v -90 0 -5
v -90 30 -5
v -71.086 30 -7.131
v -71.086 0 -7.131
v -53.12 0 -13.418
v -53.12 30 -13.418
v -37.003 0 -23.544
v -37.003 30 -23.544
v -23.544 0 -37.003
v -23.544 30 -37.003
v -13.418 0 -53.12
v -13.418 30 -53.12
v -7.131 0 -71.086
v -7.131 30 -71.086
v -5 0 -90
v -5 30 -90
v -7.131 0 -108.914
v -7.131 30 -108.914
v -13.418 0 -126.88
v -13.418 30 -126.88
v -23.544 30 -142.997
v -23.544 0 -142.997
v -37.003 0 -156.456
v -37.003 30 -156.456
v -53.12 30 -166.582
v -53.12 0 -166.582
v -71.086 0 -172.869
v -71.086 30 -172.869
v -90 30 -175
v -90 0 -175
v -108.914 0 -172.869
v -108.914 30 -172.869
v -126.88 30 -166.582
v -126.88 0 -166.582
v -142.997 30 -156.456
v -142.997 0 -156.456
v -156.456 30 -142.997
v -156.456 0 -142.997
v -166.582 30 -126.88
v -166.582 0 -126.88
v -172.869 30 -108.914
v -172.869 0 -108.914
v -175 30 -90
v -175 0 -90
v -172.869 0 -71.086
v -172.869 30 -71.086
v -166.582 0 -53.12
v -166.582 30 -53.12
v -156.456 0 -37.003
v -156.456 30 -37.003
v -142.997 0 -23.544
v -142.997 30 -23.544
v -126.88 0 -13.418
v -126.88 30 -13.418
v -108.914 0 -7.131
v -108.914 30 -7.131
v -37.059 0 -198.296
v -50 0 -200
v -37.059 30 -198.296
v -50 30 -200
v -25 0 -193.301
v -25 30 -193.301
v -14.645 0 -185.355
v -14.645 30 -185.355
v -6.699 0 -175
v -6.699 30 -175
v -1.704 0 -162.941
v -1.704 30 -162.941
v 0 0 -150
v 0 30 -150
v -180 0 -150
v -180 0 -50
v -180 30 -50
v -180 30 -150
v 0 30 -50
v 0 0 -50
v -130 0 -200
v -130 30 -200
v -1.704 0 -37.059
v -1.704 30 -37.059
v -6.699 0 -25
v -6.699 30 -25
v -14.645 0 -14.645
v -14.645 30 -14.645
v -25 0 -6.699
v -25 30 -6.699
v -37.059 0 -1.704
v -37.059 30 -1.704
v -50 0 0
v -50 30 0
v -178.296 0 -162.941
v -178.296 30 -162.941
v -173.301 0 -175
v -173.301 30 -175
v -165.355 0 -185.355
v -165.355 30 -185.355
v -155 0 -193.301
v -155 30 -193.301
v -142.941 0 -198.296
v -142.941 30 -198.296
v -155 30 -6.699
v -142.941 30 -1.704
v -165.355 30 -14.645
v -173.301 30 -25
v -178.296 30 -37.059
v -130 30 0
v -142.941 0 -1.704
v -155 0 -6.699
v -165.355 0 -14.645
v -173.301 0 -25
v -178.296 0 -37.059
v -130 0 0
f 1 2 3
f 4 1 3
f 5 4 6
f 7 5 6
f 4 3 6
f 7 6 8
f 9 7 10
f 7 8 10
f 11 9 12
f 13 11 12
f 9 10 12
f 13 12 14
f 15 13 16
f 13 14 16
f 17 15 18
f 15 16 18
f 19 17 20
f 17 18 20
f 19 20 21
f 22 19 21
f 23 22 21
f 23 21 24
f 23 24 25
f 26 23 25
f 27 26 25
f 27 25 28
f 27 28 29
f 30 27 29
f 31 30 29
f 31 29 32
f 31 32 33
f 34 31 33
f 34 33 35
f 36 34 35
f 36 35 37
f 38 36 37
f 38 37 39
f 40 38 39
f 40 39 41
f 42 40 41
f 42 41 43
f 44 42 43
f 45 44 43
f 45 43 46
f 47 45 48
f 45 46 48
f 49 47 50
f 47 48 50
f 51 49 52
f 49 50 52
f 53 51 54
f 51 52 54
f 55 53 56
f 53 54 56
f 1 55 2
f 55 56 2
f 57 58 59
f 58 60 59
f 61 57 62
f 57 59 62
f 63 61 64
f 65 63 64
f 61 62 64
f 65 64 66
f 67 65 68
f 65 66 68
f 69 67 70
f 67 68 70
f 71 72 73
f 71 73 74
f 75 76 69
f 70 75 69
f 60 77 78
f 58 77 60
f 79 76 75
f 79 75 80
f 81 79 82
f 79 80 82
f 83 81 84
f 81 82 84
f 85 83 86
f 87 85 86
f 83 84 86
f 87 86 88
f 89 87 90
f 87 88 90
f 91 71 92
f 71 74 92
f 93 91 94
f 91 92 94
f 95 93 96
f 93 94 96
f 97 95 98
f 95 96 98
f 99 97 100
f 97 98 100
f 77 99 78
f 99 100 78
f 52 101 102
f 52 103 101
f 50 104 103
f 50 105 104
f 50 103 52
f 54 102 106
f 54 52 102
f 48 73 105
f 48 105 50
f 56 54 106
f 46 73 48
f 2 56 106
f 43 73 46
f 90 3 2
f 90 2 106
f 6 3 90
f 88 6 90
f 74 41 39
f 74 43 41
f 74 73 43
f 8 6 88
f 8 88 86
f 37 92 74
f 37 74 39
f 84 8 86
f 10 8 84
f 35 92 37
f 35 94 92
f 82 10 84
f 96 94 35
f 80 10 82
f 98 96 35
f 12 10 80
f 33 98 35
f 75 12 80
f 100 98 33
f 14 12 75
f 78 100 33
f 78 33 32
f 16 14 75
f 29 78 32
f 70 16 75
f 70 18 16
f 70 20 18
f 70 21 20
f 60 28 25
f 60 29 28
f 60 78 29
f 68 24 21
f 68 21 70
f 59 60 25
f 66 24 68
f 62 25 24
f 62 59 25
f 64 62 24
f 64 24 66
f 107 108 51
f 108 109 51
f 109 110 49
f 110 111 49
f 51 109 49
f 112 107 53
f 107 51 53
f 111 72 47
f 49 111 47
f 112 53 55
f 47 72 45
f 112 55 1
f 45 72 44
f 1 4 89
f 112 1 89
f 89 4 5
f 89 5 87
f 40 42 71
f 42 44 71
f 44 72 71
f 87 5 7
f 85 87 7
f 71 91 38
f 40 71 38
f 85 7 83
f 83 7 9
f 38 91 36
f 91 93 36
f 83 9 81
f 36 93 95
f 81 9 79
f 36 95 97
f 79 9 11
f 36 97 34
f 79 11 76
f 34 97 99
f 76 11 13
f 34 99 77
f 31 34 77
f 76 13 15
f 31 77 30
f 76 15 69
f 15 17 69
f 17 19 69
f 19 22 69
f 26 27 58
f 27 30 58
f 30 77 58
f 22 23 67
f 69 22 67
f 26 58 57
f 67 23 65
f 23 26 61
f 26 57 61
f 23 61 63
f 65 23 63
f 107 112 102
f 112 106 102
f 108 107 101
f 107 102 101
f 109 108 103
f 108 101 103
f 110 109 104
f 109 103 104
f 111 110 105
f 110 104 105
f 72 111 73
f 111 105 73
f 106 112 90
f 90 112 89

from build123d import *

# Parameters (mm, degrees)
SKETCH1_W           = 180
SKETCH1_H           = 200
BOSS_EXTRUDE1_DEPTH = 30
SKETCH7_R           = 85
CUT_EXTRUDE1_DEPTH  = 40
FILLET1_R           = 50
FILLET2_R           = 50
FILLET3_R           = 50
FILLET4_R           = 50


with BuildPart() as part:
    # Sketch1 → Boss-Extrude1 (new body)
    with BuildSketch(Plane(origin=(0, 0, 0), x_dir=(1, 0, 0), z_dir=(0, 1, 0))):
        with Locations((-90, 100)):
            Rectangle(SKETCH1_W, SKETCH1_H)
    extrude(amount=BOSS_EXTRUDE1_DEPTH)

    # Sketch7 → Cut-Extrude1 (cut)
    with BuildSketch(Plane(origin=(0, 30, 0), x_dir=(1, 0, 0), z_dir=(0, 1, 0))):
        with Locations(Location((-90, 90, 0), (0, 0, 270))):
            Circle(SKETCH7_R)
    extrude(amount=-CUT_EXTRUDE1_DEPTH, mode=Mode.SUBTRACT)

    # Fillet1
    fillet1_edges = [part.edges().sort_by_distance(p)[0] for p in [
        (0, 15, -200),
    ]]
    fillet(fillet1_edges, radius=FILLET1_R)

    # Fillet2
    fillet2_edges = [part.edges().sort_by_distance(p)[0] for p in [
        (0, 15, 0),
    ]]
    fillet(fillet2_edges, radius=FILLET2_R)

    # Fillet3
    fillet3_edges = [part.edges().sort_by_distance(p)[0] for p in [
        (-180, 15, 0),
    ]]
    fillet(fillet3_edges, radius=FILLET3_R)

    # Fillet4
    fillet4_edges = [part.edges().sort_by_distance(p)[0] for p in [
        (-180, 15, -200),
    ]]
    fillet(fillet4_edges, radius=FILLET4_R)


solid = part.part
